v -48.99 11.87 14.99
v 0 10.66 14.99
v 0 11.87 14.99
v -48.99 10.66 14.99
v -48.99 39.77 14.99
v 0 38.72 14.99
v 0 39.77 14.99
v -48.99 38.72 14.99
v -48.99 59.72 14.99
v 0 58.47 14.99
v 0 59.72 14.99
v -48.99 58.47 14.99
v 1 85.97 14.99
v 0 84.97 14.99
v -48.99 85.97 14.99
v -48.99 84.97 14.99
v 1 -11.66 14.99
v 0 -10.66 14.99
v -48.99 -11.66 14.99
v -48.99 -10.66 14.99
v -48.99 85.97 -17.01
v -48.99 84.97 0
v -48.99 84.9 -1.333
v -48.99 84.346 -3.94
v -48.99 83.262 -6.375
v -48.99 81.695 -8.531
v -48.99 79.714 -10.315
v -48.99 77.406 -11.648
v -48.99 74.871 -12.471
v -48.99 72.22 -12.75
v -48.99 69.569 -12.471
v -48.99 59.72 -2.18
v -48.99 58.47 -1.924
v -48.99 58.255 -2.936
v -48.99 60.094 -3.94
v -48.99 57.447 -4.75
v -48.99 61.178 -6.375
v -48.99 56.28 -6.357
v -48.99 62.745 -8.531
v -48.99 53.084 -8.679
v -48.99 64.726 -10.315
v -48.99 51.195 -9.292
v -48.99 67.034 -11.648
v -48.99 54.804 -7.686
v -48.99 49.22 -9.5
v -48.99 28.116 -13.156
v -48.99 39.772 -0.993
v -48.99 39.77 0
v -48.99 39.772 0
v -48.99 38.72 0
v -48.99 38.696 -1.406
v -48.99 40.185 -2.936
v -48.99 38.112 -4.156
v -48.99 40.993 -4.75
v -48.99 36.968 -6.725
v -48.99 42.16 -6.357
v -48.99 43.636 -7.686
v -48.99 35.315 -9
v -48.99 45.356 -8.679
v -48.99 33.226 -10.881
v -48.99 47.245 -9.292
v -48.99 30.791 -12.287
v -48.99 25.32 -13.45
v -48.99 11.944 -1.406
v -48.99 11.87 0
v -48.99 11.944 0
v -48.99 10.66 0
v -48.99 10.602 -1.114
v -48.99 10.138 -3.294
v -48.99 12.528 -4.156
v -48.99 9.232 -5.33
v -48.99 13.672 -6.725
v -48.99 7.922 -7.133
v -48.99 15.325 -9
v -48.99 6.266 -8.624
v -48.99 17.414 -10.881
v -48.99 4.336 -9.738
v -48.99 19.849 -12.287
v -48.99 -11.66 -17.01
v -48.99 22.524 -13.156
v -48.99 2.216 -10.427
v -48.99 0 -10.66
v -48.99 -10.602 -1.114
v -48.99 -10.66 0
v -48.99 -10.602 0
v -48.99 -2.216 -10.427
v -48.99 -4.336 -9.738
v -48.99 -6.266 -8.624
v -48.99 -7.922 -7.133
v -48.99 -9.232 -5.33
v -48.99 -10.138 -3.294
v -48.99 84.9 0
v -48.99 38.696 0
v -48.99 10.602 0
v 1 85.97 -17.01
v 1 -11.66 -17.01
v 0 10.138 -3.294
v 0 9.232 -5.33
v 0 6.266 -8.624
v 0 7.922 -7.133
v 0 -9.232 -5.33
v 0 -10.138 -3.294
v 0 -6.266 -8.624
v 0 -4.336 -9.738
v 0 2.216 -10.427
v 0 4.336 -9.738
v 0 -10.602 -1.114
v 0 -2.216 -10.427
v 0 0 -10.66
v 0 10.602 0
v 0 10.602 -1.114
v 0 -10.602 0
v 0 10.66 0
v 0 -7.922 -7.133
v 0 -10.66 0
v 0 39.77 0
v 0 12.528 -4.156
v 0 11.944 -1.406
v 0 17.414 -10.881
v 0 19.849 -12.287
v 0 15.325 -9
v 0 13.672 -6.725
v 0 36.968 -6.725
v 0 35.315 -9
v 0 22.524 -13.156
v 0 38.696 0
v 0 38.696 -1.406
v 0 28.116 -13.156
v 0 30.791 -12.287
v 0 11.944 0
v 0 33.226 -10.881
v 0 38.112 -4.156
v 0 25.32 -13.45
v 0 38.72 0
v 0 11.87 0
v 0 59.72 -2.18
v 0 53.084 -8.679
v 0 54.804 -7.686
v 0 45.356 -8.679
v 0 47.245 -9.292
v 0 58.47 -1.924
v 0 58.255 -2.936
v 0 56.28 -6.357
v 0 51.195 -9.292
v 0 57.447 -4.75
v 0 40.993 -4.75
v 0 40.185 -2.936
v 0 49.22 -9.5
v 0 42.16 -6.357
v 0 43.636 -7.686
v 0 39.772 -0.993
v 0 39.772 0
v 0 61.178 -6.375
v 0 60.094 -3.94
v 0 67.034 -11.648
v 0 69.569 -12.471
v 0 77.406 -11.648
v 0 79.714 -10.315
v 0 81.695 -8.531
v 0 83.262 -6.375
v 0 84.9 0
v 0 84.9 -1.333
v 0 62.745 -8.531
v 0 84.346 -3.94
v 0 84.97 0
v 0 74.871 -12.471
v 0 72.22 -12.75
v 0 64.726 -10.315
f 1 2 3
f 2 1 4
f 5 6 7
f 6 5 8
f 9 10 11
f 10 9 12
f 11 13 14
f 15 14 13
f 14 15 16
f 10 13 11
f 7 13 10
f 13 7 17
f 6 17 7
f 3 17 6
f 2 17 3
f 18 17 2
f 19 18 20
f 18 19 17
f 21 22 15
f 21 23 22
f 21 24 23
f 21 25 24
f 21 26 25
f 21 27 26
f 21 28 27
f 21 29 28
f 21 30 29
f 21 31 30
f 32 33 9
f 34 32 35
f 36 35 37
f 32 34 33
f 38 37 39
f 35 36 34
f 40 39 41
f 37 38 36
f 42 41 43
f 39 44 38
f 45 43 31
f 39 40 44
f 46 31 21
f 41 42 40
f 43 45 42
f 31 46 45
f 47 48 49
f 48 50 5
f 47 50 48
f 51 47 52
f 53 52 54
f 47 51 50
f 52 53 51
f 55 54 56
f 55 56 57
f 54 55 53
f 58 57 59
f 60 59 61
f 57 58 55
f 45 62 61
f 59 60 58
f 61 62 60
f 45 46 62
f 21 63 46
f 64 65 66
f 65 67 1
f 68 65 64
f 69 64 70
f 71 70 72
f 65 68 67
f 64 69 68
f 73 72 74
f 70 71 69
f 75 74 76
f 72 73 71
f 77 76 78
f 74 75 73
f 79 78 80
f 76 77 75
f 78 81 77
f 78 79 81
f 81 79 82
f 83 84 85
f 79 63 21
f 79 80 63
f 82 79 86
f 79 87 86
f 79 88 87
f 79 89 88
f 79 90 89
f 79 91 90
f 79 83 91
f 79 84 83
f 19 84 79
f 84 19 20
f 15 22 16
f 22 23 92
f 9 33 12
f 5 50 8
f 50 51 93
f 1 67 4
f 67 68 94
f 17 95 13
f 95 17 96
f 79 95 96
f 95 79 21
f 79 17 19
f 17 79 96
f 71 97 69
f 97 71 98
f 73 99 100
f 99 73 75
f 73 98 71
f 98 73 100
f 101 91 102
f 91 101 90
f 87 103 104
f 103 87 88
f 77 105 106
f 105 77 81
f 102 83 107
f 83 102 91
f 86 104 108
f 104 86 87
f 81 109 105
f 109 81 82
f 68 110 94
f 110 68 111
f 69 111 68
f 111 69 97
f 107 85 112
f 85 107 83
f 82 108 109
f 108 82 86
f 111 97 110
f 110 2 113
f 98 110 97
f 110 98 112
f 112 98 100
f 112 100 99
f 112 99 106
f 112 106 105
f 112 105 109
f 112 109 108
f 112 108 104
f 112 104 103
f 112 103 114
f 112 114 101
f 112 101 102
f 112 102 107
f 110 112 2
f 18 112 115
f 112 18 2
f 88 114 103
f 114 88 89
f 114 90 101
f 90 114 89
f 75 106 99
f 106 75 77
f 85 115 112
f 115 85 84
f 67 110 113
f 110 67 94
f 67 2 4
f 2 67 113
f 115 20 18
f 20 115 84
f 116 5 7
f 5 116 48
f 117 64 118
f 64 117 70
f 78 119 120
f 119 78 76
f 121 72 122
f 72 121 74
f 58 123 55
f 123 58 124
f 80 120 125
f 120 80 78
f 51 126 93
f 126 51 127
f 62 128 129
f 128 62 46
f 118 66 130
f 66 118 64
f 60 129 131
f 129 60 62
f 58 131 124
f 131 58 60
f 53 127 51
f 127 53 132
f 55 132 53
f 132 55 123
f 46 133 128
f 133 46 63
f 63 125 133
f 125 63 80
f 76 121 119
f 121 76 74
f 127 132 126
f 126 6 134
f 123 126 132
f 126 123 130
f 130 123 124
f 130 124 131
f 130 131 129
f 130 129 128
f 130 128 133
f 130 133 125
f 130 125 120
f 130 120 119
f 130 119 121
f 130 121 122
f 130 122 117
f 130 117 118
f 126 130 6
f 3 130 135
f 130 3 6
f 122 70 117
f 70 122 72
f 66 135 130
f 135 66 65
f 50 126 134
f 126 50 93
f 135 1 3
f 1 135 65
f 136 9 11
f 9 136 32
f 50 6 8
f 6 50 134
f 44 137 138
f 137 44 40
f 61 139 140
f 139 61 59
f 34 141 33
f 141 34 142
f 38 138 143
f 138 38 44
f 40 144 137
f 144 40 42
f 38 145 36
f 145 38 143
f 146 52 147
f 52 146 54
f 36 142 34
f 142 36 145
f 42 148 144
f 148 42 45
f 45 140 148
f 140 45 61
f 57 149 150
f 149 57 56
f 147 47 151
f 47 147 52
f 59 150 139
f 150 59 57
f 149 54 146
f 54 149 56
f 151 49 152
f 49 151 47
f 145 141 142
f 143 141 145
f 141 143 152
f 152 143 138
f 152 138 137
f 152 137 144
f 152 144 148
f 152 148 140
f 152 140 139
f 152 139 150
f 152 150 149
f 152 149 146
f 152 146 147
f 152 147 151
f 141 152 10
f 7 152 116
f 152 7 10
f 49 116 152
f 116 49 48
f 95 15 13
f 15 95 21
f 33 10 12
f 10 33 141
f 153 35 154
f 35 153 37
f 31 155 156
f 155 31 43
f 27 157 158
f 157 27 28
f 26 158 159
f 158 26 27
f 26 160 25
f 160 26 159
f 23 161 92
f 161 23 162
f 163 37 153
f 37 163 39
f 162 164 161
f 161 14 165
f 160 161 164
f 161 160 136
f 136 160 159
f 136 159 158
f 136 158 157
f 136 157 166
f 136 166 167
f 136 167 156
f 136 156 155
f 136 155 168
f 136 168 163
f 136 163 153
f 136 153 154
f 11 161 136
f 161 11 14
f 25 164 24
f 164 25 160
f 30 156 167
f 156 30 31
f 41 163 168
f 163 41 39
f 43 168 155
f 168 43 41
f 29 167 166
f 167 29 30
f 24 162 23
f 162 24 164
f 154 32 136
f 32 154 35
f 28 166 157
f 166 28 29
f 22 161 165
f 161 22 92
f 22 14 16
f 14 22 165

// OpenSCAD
slot_length=50;
slot_height=30;

module coin_slot(nominal_dia) {
  dia = nominal_dia + 1;
  full_width = dia+2;
  
  extra_height = slot_height-dia;

  rotate(a=-90, v=[0, 1, 0]) {

    difference() {
      translate([-(full_width+extra_height)/2-1.01, -full_width/2, -1])
        cube([full_width+extra_height, full_width, slot_length-0.01]);

      cylinder(r=dia/2, h=slot_length);
      translate([0, -dia/2, 0])
        cube([slot_height/2, dia, slot_length]);
    }
  }
}

// 1p
coin_slot(20.32);


// 2p
/* FIXME: Make this formula in the center make more sense */
translate([0, 20.32+5, 0])
 coin_slot(25.9);

// 5p
translate([0, 20.32+5+25.9-2, 0])
 coin_slot(18);

// 10p
translate([0, 20.32+5+25.9-2+18+5, 0])
 coin_slot(24.5);
